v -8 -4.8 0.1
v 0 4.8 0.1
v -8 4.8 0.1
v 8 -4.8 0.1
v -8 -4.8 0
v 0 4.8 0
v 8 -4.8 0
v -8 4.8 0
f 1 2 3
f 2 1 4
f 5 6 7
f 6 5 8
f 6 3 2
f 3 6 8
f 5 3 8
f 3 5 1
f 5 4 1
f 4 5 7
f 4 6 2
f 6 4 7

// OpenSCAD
// file: ../p/4-4edge.scad
use <../lib.scad>
$fa=1; $fs=0.2;
function ldraw_lib__4_4edge(realsolid=false) = [
// 0 Circle 1.0
// 0 Name: 4-4edge.dat
// 0 Author: James Jessiman
// 0 !LDRAW_ORG Primitive UPDATE 2017-01
// 0 !LICENSE Licensed under CC BY 2.0 and CC BY 4.0 : see CAreadme.txt
// 
// 0 BFC CERTIFY CCW
  [0,"BFC","CERTIFY"],
  [0,"BFC","CCW"],
// 
// 0 !HISTORY 1998-12-15 [PTadmin] Official Update 1998-10
// 0 !HISTORY 2005-12-28 [PTadmin] Official Update 2005-01
// 0 !HISTORY 2007-06-24 [PTadmin] Header formatted for Contributor Agreement
// 0 !HISTORY 2008-07-01 [PTadmin] Official Update 2008-01
// 0 !HISTORY 2017-01-15 [Steffen] BFCed
// 0 !HISTORY 2017-12-30 [PTadmin] Official Update 2017-01
// 
// 
// 2 24 1 0 0 0.9239 0 0.3827
  [2,24,1,0,0,0.9239,0,0.3827],
// 2 24 0.9239 0 0.3827 0.7071 0 0.7071
  [2,24,0.9239,0,0.3827,0.7071,0,0.7071],
// 2 24 0.7071 0 0.7071 0.3827 0 0.9239
  [2,24,0.7071,0,0.7071,0.3827,0,0.9239],
// 2 24 0.3827 0 0.9239 0 0 1
  [2,24,0.3827,0,0.9239,0,0,1],
// 2 24 0 0 1 -0.3827 0 0.9239
  [2,24,0,0,1,-0.3827,0,0.9239],
// 2 24 -0.3827 0 0.9239 -0.7071 0 0.7071
  [2,24,-0.3827,0,0.9239,-0.7071,0,0.7071],
// 2 24 -0.7071 0 0.7071 -0.9239 0 0.3827
  [2,24,-0.7071,0,0.7071,-0.9239,0,0.3827],
// 2 24 -0.9239 0 0.3827 -1 0 -0
  [2,24,-0.9239,0,0.3827,-1,0,-0],
// 2 24 -1 0 -0 -0.9239 0 -0.3827
  [2,24,-1,0,-0,-0.9239,0,-0.3827],
// 2 24 -0.9239 0 -0.3827 -0.7071 0 -0.7071
  [2,24,-0.9239,0,-0.3827,-0.7071,0,-0.7071],
// 2 24 -0.7071 0 -0.7071 -0.3827 0 -0.9239
  [2,24,-0.7071,0,-0.7071,-0.3827,0,-0.9239],
// 2 24 -0.3827 0 -0.9239 0 0 -1
  [2,24,-0.3827,0,-0.9239,0,0,-1],
// 2 24 0 0 -1 0.3827 0 -0.9239
  [2,24,0,0,-1,0.3827,0,-0.9239],
// 2 24 0.3827 0 -0.9239 0.7071 0 -0.7071
  [2,24,0.3827,0,-0.9239,0.7071,0,-0.7071],
// 2 24 0.7071 0 -0.7071 0.9239 0 -0.3827
  [2,24,0.7071,0,-0.7071,0.9239,0,-0.3827],
// 2 24 0.9239 0 -0.3827 1 0 0
  [2,24,0.9239,0,-0.3827,1,0,0],
];
module ldraw_lib__4_4edge(step=0, col=false, unit=2/5, alt=false, line=0.2, solid=!$preview)
    makepoly(ldraw_lib__4_4edge(solid), step=step, col=col, unit=unit, alt=alt, line=line, solid=solid);
ldraw_lib__4_4edge(line=0.2);
// file: ../p/4-4disc.scad
use <../lib.scad>
$fa=1; $fs=0.2;
function ldraw_lib__4_4disc(realsolid=false) = [
// 0 Disc 1.0
// 0 Name: 4-4disc.dat
// 0 Author: James Jessiman
// 0 !LDRAW_ORG Primitive UPDATE 2002-02
// 0 !LICENSE Licensed under CC BY 2.0 and CC BY 4.0 : see CAreadme.txt
// 
// 0 BFC CERTIFY CCW
  [0,"BFC","CERTIFY"],
  [0,"BFC","CCW"],
// 
// 0 !HISTORY 1998-12-15 [PTadmin] Official Update 1998-10
// 0 !HISTORY 2002-03-23 [sbliss] Added BFC statement
// 0 !HISTORY 2002-04-25 [PTadmin] Official Update 2002-02
// 0 !HISTORY 2007-06-24 [PTadmin] Header formatted for Contributor Agreement
// 0 !HISTORY 2008-07-01 [PTadmin] Official Update 2008-01
// 
// 
// 3 16 0 0 0 1 0 0 0.9239 0 0.3827
  [3,16,0,0,0,1,0,0,0.9239,0,0.3827],
// 3 16 0 0 0 0.9239 0 0.3827 0.7071 0 0.7071
  [3,16,0,0,0,0.9239,0,0.3827,0.7071,0,0.7071],
// 3 16 0 0 0 0.7071 0 0.7071 0.3827 0 0.9239
  [3,16,0,0,0,0.7071,0,0.7071,0.3827,0,0.9239],
// 3 16 0 0 0 0.3827 0 0.9239 0 0 1
  [3,16,0,0,0,0.3827,0,0.9239,0,0,1],
// 3 16 0 0 0 0 0 1 -0.3827 0 0.9239
  [3,16,0,0,0,0,0,1,-0.3827,0,0.9239],
// 3 16 0 0 0 -0.3827 0 0.9239 -0.7071 0 0.7071
  [3,16,0,0,0,-0.3827,0,0.9239,-0.7071,0,0.7071],
// 3 16 0 0 0 -0.7071 0 0.7071 -0.9239 0 0.3827
  [3,16,0,0,0,-0.7071,0,0.7071,-0.9239,0,0.3827],
// 3 16 0 0 0 -0.9239 0 0.3827 -1 0 -0
  [3,16,0,0,0,-0.9239,0,0.3827,-1,0,-0],
// 3 16 0 0 0 -1 0 -0 -0.9239 0 -0.3827
  [3,16,0,0,0,-1,0,-0,-0.9239,0,-0.3827],
// 3 16 0 0 0 -0.9239 0 -0.3827 -0.7071 0 -0.7071
  [3,16,0,0,0,-0.9239,0,-0.3827,-0.7071,0,-0.7071],
// 3 16 0 0 0 -0.7071 0 -0.7071 -0.3827 0 -0.9239
  [3,16,0,0,0,-0.7071,0,-0.7071,-0.3827,0,-0.9239],
// 3 16 0 0 0 -0.3827 0 -0.9239 0 0 -1
  [3,16,0,0,0,-0.3827,0,-0.9239,0,0,-1],
// 3 16 0 0 0 0 0 -1 0.3827 0 -0.9239
  [3,16,0,0,0,0,0,-1,0.3827,0,-0.9239],
// 3 16 0 0 0 0.3827 0 -0.9239 0.7071 0 -0.7071
  [3,16,0,0,0,0.3827,0,-0.9239,0.7071,0,-0.7071],
// 3 16 0 0 0 0.7071 0 -0.7071 0.9239 0 -0.3827
  [3,16,0,0,0,0.7071,0,-0.7071,0.9239,0,-0.3827],
// 3 16 0 0 0 0.9239 0 -0.3827 1 0 0
  [3,16,0,0,0,0.9239,0,-0.3827,1,0,0],
// 0
];
module ldraw_lib__4_4disc(step=0, col=false, unit=2/5, alt=false, line=0.2, solid=!$preview)
    makepoly(ldraw_lib__4_4disc(solid), step=step, col=col, unit=unit, alt=alt, line=line, solid=solid);
ldraw_lib__4_4disc(line=0.2);
// file: ../p/4-4cyli.scad
use <../lib.scad>
$fa=1; $fs=0.2;
function ldraw_lib__4_4cyli(realsolid=false) = [
// 0 Cylinder 1.0
// 0 Name: 4-4cyli.dat
// 0 Author: James Jessiman
// 0 !LDRAW_ORG Primitive UPDATE 2005-01
// 0 !LICENSE Licensed under CC BY 2.0 and CC BY 4.0 : see CAreadme.txt
// 
// 0 BFC CERTIFY CCW
  [0,"BFC","CERTIFY"],
  [0,"BFC","CCW"],
// 
// 0 !HISTORY 1998-12-15 [PTadmin] Official Update 1998-10
// 0 !HISTORY 2002-03-23 [sbliss] Added BFC statement; merged headers from files in distributions LDraw 0.27 and Complete.
// 0 !HISTORY 2002-04-25 [PTadmin] Official Update 2002-02
// 0 !HISTORY 2004-12-14 [guyvivan] BFC CCW
// 0 !HISTORY 2005-12-28 [PTadmin] Official Update 2005-01
// 0 !HISTORY 2007-06-24 [PTadmin] Header formatted for Contributor Agreement
// 0 !HISTORY 2008-07-01 [PTadmin] Official Update 2008-01
// 
// 
// 4 16 1 1 0 0.9239 1 0.3827 0.9239 0 0.3827 1 0 0
  [4,16,1,1,0,0.9239,1,0.3827,0.9239,0,0.3827,1,0,0],
// 5 24 1 0 0 1 1 0 0.9239 0 0.3827 0.9239 0 -0.3827
  [5,24,1,0,0,1,1,0,0.9239,0,0.3827,0.9239,0,-0.3827],
// 4 16 0.9239 1 0.3827 0.7071 1 0.7071 0.7071 0 0.7071 0.9239 0 0.3827
  [4,16,0.9239,1,0.3827,0.7071,1,0.7071,0.7071,0,0.7071,0.9239,0,0.3827],
// 5 24 0.9239 0 0.3827 0.9239 1 0.3827 0.7071 0 0.7071 1 0 0
  [5,24,0.9239,0,0.3827,0.9239,1,0.3827,0.7071,0,0.7071,1,0,0],
// 4 16 0.7071 1 0.7071 0.3827 1 0.9239 0.3827 0 0.9239 0.7071 0 0.7071
  [4,16,0.7071,1,0.7071,0.3827,1,0.9239,0.3827,0,0.9239,0.7071,0,0.7071],
// 5 24 0.7071 0 0.7071 0.7071 1 0.7071 0.3827 0 0.9239 0.9239 0 0.3827
  [5,24,0.7071,0,0.7071,0.7071,1,0.7071,0.3827,0,0.9239,0.9239,0,0.3827],
// 4 16 0.3827 1 0.9239 0 1 1 0 0 1 0.3827 0 0.9239
  [4,16,0.3827,1,0.9239,0,1,1,0,0,1,0.3827,0,0.9239],
// 5 24 0.3827 0 0.9239 0.3827 1 0.9239 0 0 1 0.7071 0 0.7071
  [5,24,0.3827,0,0.9239,0.3827,1,0.9239,0,0,1,0.7071,0,0.7071],
// 4 16 0 1 1 -0.3827 1 0.9239 -0.3827 0 0.9239 0 0 1
  [4,16,0,1,1,-0.3827,1,0.9239,-0.3827,0,0.9239,0,0,1],
// 5 24 0 0 1 0 1 1 -0.3827 0 0.9239 0.3827 0 0.9239
  [5,24,0,0,1,0,1,1,-0.3827,0,0.9239,0.3827,0,0.9239],
// 4 16 -0.3827 1 0.9239 -0.7071 1 0.7071 -0.7071 0 0.7071 -0.3827 0 0.9239
  [4,16,-0.3827,1,0.9239,-0.7071,1,0.7071,-0.7071,0,0.7071,-0.3827,0,0.9239],
// 5 24 -0.3827 0 0.9239 -0.3827 1 0.9239 -0.7071 0 0.7071 0 0 1
  [5,24,-0.3827,0,0.9239,-0.3827,1,0.9239,-0.7071,0,0.7071,0,0,1],
// 4 16 -0.7071 1 0.7071 -0.9239 1 0.3827 -0.9239 0 0.3827 -0.7071 0 0.7071
  [4,16,-0.7071,1,0.7071,-0.9239,1,0.3827,-0.9239,0,0.3827,-0.7071,0,0.7071],
// 5 24 -0.7071 0 0.7071 -0.7071 1 0.7071 -0.9239 0 0.3827 -0.3827 0 0.9239
  [5,24,-0.7071,0,0.7071,-0.7071,1,0.7071,-0.9239,0,0.3827,-0.3827,0,0.9239],
// 4 16 -0.9239 1 0.3827 -1 1 0 -1 0 0 -0.9239 0 0.3827
  [4,16,-0.9239,1,0.3827,-1,1,0,-1,0,0,-0.9239,0,0.3827],
// 5 24 -0.9239 0 0.3827 -0.9239 1 0.3827 -1 0 0 -0.7071 0 0.7071
  [5,24,-0.9239,0,0.3827,-0.9239,1,0.3827,-1,0,0,-0.7071,0,0.7071],
// 4 16 -1 1 0 -0.9239 1 -0.3827 -0.9239 0 -0.3827 -1 0 0
  [4,16,-1,1,0,-0.9239,1,-0.3827,-0.9239,0,-0.3827,-1,0,0],
// 5 24 -1 0 0 -1 1 0 -0.9239 0 -0.3827 -0.9239 0 0.3827
  [5,24,-1,0,0,-1,1,0,-0.9239,0,-0.3827,-0.9239,0,0.3827],
// 4 16 -0.9239 1 -0.3827 -0.7071 1 -0.7071 -0.7071 0 -0.7071 -0.9239 0 -0.3827
  [4,16,-0.9239,1,-0.3827,-0.7071,1,-0.7071,-0.7071,0,-0.7071,-0.9239,0,-0.3827],
// 5 24 -0.9239 0 -0.3827 -0.9239 1 -0.3827 -0.7071 0 -0.7071 -1 0 0
  [5,24,-0.9239,0,-0.3827,-0.9239,1,-0.3827,-0.7071,0,-0.7071,-1,0,0],
// 4 16 -0.7071 1 -0.7071 -0.3827 1 -0.9239 -0.3827 0 -0.9239 -0.7071 0 -0.7071
  [4,16,-0.7071,1,-0.7071,-0.3827,1,-0.9239,-0.3827,0,-0.9239,-0.7071,0,-0.7071],
// 5 24 -0.7071 0 -0.7071 -0.7071 1 -0.7071 -0.3827 0 -0.9239 -0.9239 0 -0.3827
  [5,24,-0.7071,0,-0.7071,-0.7071,1,-0.7071,-0.3827,0,-0.9239,-0.9239,0,-0.3827],
// 4 16 -0.3827 1 -0.9239 0 1 -1 0 0 -1 -0.3827 0 -0.9239
  [4,16,-0.3827,1,-0.9239,0,1,-1,0,0,-1,-0.3827,0,-0.9239],
// 5 24 -0.3827 0 -0.9239 -0.3827 1 -0.9239 0 0 -1 -0.7071 0 -0.7071
  [5,24,-0.3827,0,-0.9239,-0.3827,1,-0.9239,0,0,-1,-0.7071,0,-0.7071],
// 4 16 0 1 -1 0.3827 1 -0.9239 0.3827 0 -0.9239 0 0 -1
  [4,16,0,1,-1,0.3827,1,-0.9239,0.3827,0,-0.9239,0,0,-1],
// 5 24 0 0 -1 0 1 -1 0.3827 0 -0.9239 -0.3827 0 -0.9239
  [5,24,0,0,-1,0,1,-1,0.3827,0,-0.9239,-0.3827,0,-0.9239],
// 4 16 0.3827 1 -0.9239 0.7071 1 -0.7071 0.7071 0 -0.7071 0.3827 0 -0.9239
  [4,16,0.3827,1,-0.9239,0.7071,1,-0.7071,0.7071,0,-0.7071,0.3827,0,-0.9239],
// 5 24 0.3827 0 -0.9239 0.3827 1 -0.9239 0.7071 0 -0.7071 0 0 -1
  [5,24,0.3827,0,-0.9239,0.3827,1,-0.9239,0.7071,0,-0.7071,0,0,-1],
// 4 16 0.7071 1 -0.7071 0.9239 1 -0.3827 0.9239 0 -0.3827 0.7071 0 -0.7071
  [4,16,0.7071,1,-0.7071,0.9239,1,-0.3827,0.9239,0,-0.3827,0.7071,0,-0.7071],
// 5 24 0.7071 0 -0.7071 0.7071 1 -0.7071 0.9239 0 -0.3827 0.3827 0 -0.9239
  [5,24,0.7071,0,-0.7071,0.7071,1,-0.7071,0.9239,0,-0.3827,0.3827,0,-0.9239],
// 4 16 0.9239 1 -0.3827 1 1 0 1 0 0 0.9239 0 -0.3827
  [4,16,0.9239,1,-0.3827,1,1,0,1,0,0,0.9239,0,-0.3827],
// 5 24 0.9239 0 -0.3827 0.9239 1 -0.3827 1 0 0 0.7071 0 -0.7071
  [5,24,0.9239,0,-0.3827,0.9239,1,-0.3827,1,0,0,0.7071,0,-0.7071],
// 0
];
module ldraw_lib__4_4cyli(step=0, col=false, unit=2/5, alt=false, line=0.2, solid=!$preview)
    makepoly(ldraw_lib__4_4cyli(solid), step=step, col=col, unit=unit, alt=alt, line=line, solid=solid);
ldraw_lib__4_4cyli(line=0.2);
// file: ../p/stud3.scad
use <../lib.scad>
use <4-4cyli.scad>
use <4-4disc.scad>
use <4-4edge.scad>
$fa=1; $fs=0.2;
function ldraw_lib__stud3(realsolid=false) = realsolid ? 
    [openscad(translate([0,0,-eps()], o=cylinder(4+eps(), r=4)),2)] : [
// 0 Stud Tube Solid
// 0 Name: stud3.dat
// 0 Author: James Jessiman
// 0 !LDRAW_ORG Primitive UPDATE 2012-01
// 0 !LICENSE Licensed under CC BY 2.0 and CC BY 4.0 : see CAreadme.txt
// 
// 0 BFC CERTIFY CCW
  [0,"BFC","CERTIFY"],
  [0,"BFC","CCW"],
// 
// 0 !HISTORY 2002-04-04 [sbliss] Modified for BFC compliance
// 0 !HISTORY 2002-04-25 [PTadmin] Official Update 2002-02
// 0 !HISTORY 2007-06-24 [PTadmin] Header formatted for Contributor Agreement
// 0 !HISTORY 2008-07-01 [PTadmin] Official Update 2008-01
// 0 !HISTORY 2012-02-16 [Philo] Changed to CCW
// 0 !HISTORY 2012-03-30 [PTadmin] Official Update 2012-01
// 
// 
// 1 16 0 -4 0 4 0 0 0 1 0 0 0 4 4-4edge.dat
  [1,16,0,-4,0,4,0,0,0,1,0,0,0,4, ldraw_lib__4_4edge(realsolid)],
// 1 16 0 0 0 4 0 0 0 1 0 0 0 4 4-4edge.dat
  [1,16,0,0,0,4,0,0,0,1,0,0,0,4, ldraw_lib__4_4edge(realsolid)],
// 1 16 0 -4 0 4 0 0 0 1 0 0 0 4 4-4disc.dat
  [1,16,0,-4,0,4,0,0,0,1,0,0,0,4, ldraw_lib__4_4disc(realsolid)],
// 1 16 0 -4 0 4 0 0 0 4 0 0 0 4 4-4cyli.dat
  [1,16,0,-4,0,4,0,0,0,4,0,0,0,4, ldraw_lib__4_4cyli(realsolid)],
];
module ldraw_lib__stud3(step=0, col=false, unit=2/5, alt=false, line=0.2, solid=!$preview)
    makepoly(ldraw_lib__stud3(solid), step=step, col=col, unit=unit, alt=alt, line=line, solid=solid);
ldraw_lib__stud3(line=0.2);
// file: ../p/stud.scad
use <../lib.scad>
use <4-4cyli.scad>
use <4-4disc.scad>
use <4-4edge.scad>
$fa=1; $fs=0.2;
function ldraw_lib__stud(realsolid=false) = realsolid ? 
    [openscad(translate([0,0,-eps()], o=cylinder(4+eps(), r=6)),2)] : [
// 0 Stud
// 0 Name: stud.dat
// 0 Author: James Jessiman
// 0 !LDRAW_ORG Primitive UPDATE 2012-01
// 0 !LICENSE Licensed under CC BY 2.0 and CC BY 4.0 : see CAreadme.txt
// 
// 0 BFC CERTIFY CCW
  [0,"BFC","CERTIFY"],
  [0,"BFC","CCW"],
// 
// 0 !HISTORY 2002-04-04 [sbliss] Modified for BFC compliance
// 0 !HISTORY 2002-04-25 [PTadmin] Official Update 2002-02
// 0 !HISTORY 2007-06-24 [PTadmin] Header formatted for Contributor Agreement
// 0 !HISTORY 2008-07-01 [PTadmin] Official Update 2008-01
// 0 !HISTORY 2012-02-16 [Philo] Changed to CCW
// 0 !HISTORY 2012-03-30 [PTadmin] Official Update 2012-01
// 
// 
// 1 16 0 0 0 6 0 0 0 1 0 0 0 6 4-4edge.dat
  [1,16,0,0,0,6,0,0,0,1,0,0,0,6, ldraw_lib__4_4edge(realsolid)],
// 1 16 0 -4 0 6 0 0 0 1 0 0 0 6 4-4edge.dat
  [1,16,0,-4,0,6,0,0,0,1,0,0,0,6, ldraw_lib__4_4edge(realsolid)],
// 1 16 0 0 0 6 0 0 0 -4 0 0 0 6 4-4cyli.dat
  [1,16,0,0,0,6,0,0,0,-4,0,0,0,6, ldraw_lib__4_4cyli(realsolid)],
// 1 16 0 -4 0 6 0 0 0 1 0 0 0 6 4-4disc.dat
  [1,16,0,-4,0,6,0,0,0,1,0,0,0,6, ldraw_lib__4_4disc(realsolid)],
];
module ldraw_lib__stud(step=0, col=false, unit=2/5, alt=false, line=0.2, solid=!$preview)
    makepoly(ldraw_lib__stud(solid), step=step, col=col, unit=unit, alt=alt, line=line, solid=solid);
ldraw_lib__stud(line=0.2);
// file: ../p/box5.scad
use <../lib.scad>
$fa=1; $fs=0.2;
function ldraw_lib__box5(realsolid=false) = [
// 0 Box with 5 Faces and All Edges
// 0 Name: box5.dat
// 0 Author: James Jessiman
// 0 !LDRAW_ORG Primitive UPDATE 2012-01
// 0 !LICENSE Licensed under CC BY 2.0 and CC BY 4.0 : see CAreadme.txt
// 
// 0 BFC CERTIFY CCW
  [0,"BFC","CERTIFY"],
  [0,"BFC","CCW"],
// 
// 0 !HISTORY 2002-04-03 [sbliss] Modified for BFC compliance
// 0 !HISTORY 2002-04-25 [PTadmin] Official Update 2002-02
// 0 !HISTORY 2007-06-24 [PTadmin] Header formatted for Contributor Agreement
// 0 !HISTORY 2008-07-01 [PTadmin] Official Update 2008-01
// 0 !HISTORY 2012-02-16 [Philo] Changed to CCW
// 0 !HISTORY 2012-03-30 [PTadmin] Official Update 2012-01
// 
// 
// 2 24 1 1 1 -1 1 1
  [2,24,1,1,1,-1,1,1],
// 2 24 -1 1 1 -1 1 -1
  [2,24,-1,1,1,-1,1,-1],
// 2 24 -1 1 -1 1 1 -1
  [2,24,-1,1,-1,1,1,-1],
// 2 24 1 1 -1 1 1 1
  [2,24,1,1,-1,1,1,1],
// 2 24 1 0 1 -1 0 1
  [2,24,1,0,1,-1,0,1],
// 2 24 -1 0 1 -1 0 -1
  [2,24,-1,0,1,-1,0,-1],
// 2 24 -1 0 -1 1 0 -1
  [2,24,-1,0,-1,1,0,-1],
// 2 24 1 0 -1 1 0 1
  [2,24,1,0,-1,1,0,1],
// 2 24 1 0 1 1 1 1
  [2,24,1,0,1,1,1,1],
// 2 24 -1 0 1 -1 1 1
  [2,24,-1,0,1,-1,1,1],
// 2 24 1 0 -1 1 1 -1
  [2,24,1,0,-1,1,1,-1],
// 2 24 -1 0 -1 -1 1 -1
  [2,24,-1,0,-1,-1,1,-1],
// 4 16 -1 1 1 1 1 1 1 1 -1 -1 1 -1
  [4,16,-1,1,1,1,1,1,1,1,-1,-1,1,-1],
// 4 16 -1 1 1 -1 0 1 1 0 1 1 1 1
  [4,16,-1,1,1,-1,0,1,1,0,1,1,1,1],
// 4 16 -1 1 -1 -1 0 -1 -1 0 1 -1 1 1
  [4,16,-1,1,-1,-1,0,-1,-1,0,1,-1,1,1],
// 4 16 1 1 -1 1 0 -1 -1 0 -1 -1 1 -1
  [4,16,1,1,-1,1,0,-1,-1,0,-1,-1,1,-1],
// 4 16 1 1 1 1 0 1 1 0 -1 1 1 -1
  [4,16,1,1,1,1,0,1,1,0,-1,1,1,-1],
];
module ldraw_lib__box5(step=0, col=false, unit=2/5, alt=false, line=0.2, solid=!$preview)
    makepoly(ldraw_lib__box5(solid), step=step, col=col, unit=unit, alt=alt, line=line, solid=solid);
ldraw_lib__box5(line=0.2);
// file: ../p/box4t.scad
use <../lib.scad>
$fa=1; $fs=0.2;
function ldraw_lib__box4t(realsolid=false) = [
// 0 Box with 4 Adjacent Faces and All Edges
// 0 Name: box4t.dat
// 0 Author: Tore Eriksson [Tore_Eriksson]
// 0 !LDRAW_ORG Primitive UPDATE 2003-02
// 0 !LICENSE Licensed under CC BY 2.0 and CC BY 4.0 : see CAreadme.txt
// 
// 0 BFC CERTIFY CCW
  [0,"BFC","CERTIFY"],
  [0,"BFC","CCW"],
// 
// 0 !HISTORY 1997-09-29 [PTadmin] Official Update 1997-15
// 0 !HISTORY 2002-08-31 [izanette] Modified with WINDZ for BFC compliance
// 0 !HISTORY 2003-08-01 [PTadmin] Official Update 2003-02
// 0 !HISTORY 2007-06-24 [PTadmin] Header formatted for Contributor Agreement
// 0 !HISTORY 2008-07-01 [PTadmin] Official Update 2008-01
// 
// 
// 2 24 1 1 1 -1 1 1
  [2,24,1,1,1,-1,1,1],
// 2 24 -1 1 1 -1 1 -1
  [2,24,-1,1,1,-1,1,-1],
// 2 24 -1 1 -1 1 1 -1
  [2,24,-1,1,-1,1,1,-1],
// 2 24 1 1 -1 1 1 1
  [2,24,1,1,-1,1,1,1],
// 2 24 1 0 1 -1 0 1
  [2,24,1,0,1,-1,0,1],
// 2 24 -1 0 1 -1 0 -1
  [2,24,-1,0,1,-1,0,-1],
// 2 24 -1 0 -1 1 0 -1
  [2,24,-1,0,-1,1,0,-1],
// 2 24 1 0 -1 1 0 1
  [2,24,1,0,-1,1,0,1],
// 2 24 1 0 1 1 1 1
  [2,24,1,0,1,1,1,1],
// 2 24 -1 0 1 -1 1 1
  [2,24,-1,0,1,-1,1,1],
// 2 24 1 0 -1 1 1 -1
  [2,24,1,0,-1,1,1,-1],
// 2 24 -1 0 -1 -1 1 -1
  [2,24,-1,0,-1,-1,1,-1],
// 4 16 1 1 1 1 1 -1 -1 1 -1 -1 1 1
  [4,16,1,1,1,1,1,-1,-1,1,-1,-1,1,1],
// 4 16 1 1 1 -1 1 1 -1 0 1 1 0 1
  [4,16,1,1,1,-1,1,1,-1,0,1,1,0,1],
// 4 16 -1 1 1 -1 1 -1 -1 0 -1 -1 0 1
  [4,16,-1,1,1,-1,1,-1,-1,0,-1,-1,0,1],
// 0 4 16 -1 1 -1 -1 0 -1 1 0 -1 1 1 -1
// 4 16 1 1 -1 1 1 1 1 0 1 1 0 -1
  [4,16,1,1,-1,1,1,1,1,0,1,1,0,-1],
// 0
];
module ldraw_lib__box4t(step=0, col=false, unit=2/5, alt=false, line=0.2, solid=!$preview)
    makepoly(ldraw_lib__box4t(solid), step=step, col=col, unit=unit, alt=alt, line=line, solid=solid);
ldraw_lib__box4t(line=0.2);
// file: s/3004s01.scad
use <../../lib.scad>
use <../../p/box4t.scad>
use <../../p/box5.scad>
use <../../p/stud.scad>
use <../../p/stud3.scad>
$fa=1; $fs=0.2;
function ldraw_lib__s__3004s01(realsolid=false) = [
// 0 ~Brick  1 x  2 without Front Face
// 0 Name: s\3004s01.dat
// 0 Author: James Jessiman
// 0 !LDRAW_ORG Subpart UPDATE 2003-03
// 0 !LICENSE Licensed under CC BY 2.0 and CC BY 4.0 : see CAreadme.txt
// 
// 0 BFC CERTIFY CCW
  [0,"BFC","CERTIFY"],
  [0,"BFC","CCW"],
// 
// 0 !HISTORY 2003-09-07 [jriley] Subfiling, BFC
// 0 !HISTORY 2003-12-19 [PTadmin] Official Update 2003-03
// 0 !HISTORY 2007-08-29 [PTadmin] Header formatted for Contributor Agreement
// 0 !HISTORY 2008-07-01 [PTadmin] Official Update 2008-01
// 
// 
// 1 16 0 4 0 1 0 0 0 -5 0 0 0 1 stud3.dat
  [1,16,0,4,0,1,0,0,0,-5,0,0,0,1, ldraw_lib__stud3(realsolid)],
// 0 BFC INVERTNEXT
  [0,"BFC","INVERTNEXT"],
// 1 16 0 24 0 16 0 0 0 -20 0 0 0 6 box5.dat
  [1,16,0,24,0,16,0,0,0,-20,0,0,0,6, ldraw_lib__box5(realsolid)],
// 4 16 20 24 10 16 24 6 -16 24 6 -20 24 10
  [4,16,20,24,10,16,24,6,-16,24,6,-20,24,10],
// 4 16 -20 24 10 -16 24 6 -16 24 -6 -20 24 -10
  [4,16,-20,24,10,-16,24,6,-16,24,-6,-20,24,-10],
// 4 16 -20 24 -10 -16 24 -6 16 24 -6 20 24 -10
  [4,16,-20,24,-10,-16,24,-6,16,24,-6,20,24,-10],
// 4 16 20 24 -10 16 24 -6 16 24 6 20 24 10
  [4,16,20,24,-10,16,24,-6,16,24,6,20,24,10],
// 1 16 0 24 0 20 0 0 0 -24 0 0 0 10 box4t.dat
  [1,16,0,24,0,20,0,0,0,-24,0,0,0,10, ldraw_lib__box4t(realsolid)],
// 1 16 10 0 0 1 0 0 0 1 0 0 0 1 stud.dat
  [1,16,10,0,0,1,0,0,0,1,0,0,0,1, ldraw_lib__stud(realsolid)],
// 1 16 -10 0 0 1 0 0 0 1 0 0 0 1 stud.dat
  [1,16,-10,0,0,1,0,0,0,1,0,0,0,1, ldraw_lib__stud(realsolid)],
// 0
];
module ldraw_lib__s__3004s01(step=0, col=false, unit=2/5, alt=false, line=0.2, solid=!$preview)
    makepoly(ldraw_lib__s__3004s01(solid), step=step, col=col, unit=unit, alt=alt, line=line, solid=solid);
ldraw_lib__s__3004s01(line=0.2);
// file: 3004.scad
use <../lib.scad>
use <s/3004s01.scad>
$fa=1; $fs=0.2;
function ldraw_lib__3004(realsolid=false) = [
// 0 Brick  1 x  2
// 0 Name: 3004.dat
// 0 Author: James Jessiman
// 0 !LDRAW_ORG Part UPDATE 2022-05
// 0 !LICENSE Licensed under CC BY 2.0 and CC BY 4.0 : see CAreadme.txt
// 
// 0 BFC CERTIFY CCW
  [0,"BFC","CERTIFY"],
  [0,"BFC","CCW"],
// 
// 0 !HISTORY 2001-10-26 [PTadmin] Official Update 2001-01
// 0 !HISTORY 2002-05-07 {unknown} BFC Certification
// 0 !HISTORY 2002-06-11 [PTadmin] Official Update 2002-03
// 0 !HISTORY 2007-05-07 [PTadmin] Header formatted for Contributor Agreement
// 0 !HISTORY 2008-07-01 [PTadmin] Official Update 2008-01
// 0 !HISTORY 2022-08-04 [MagFors] Using subfile
// 0 !HISTORY 2022-09-15 [PTadmin] Official Update 2022-05
// 
// 
// 1 16 0 0 0 1 0 0 0 1 0 0 0 1 s\3004s01.dat
  [1,16,0,0,0,1,0,0,0,1,0,0,0,1, ldraw_lib__s__3004s01(realsolid)],
// 4 16 -20 24 -10 20 24 -10 20 0 -10 -20 0 -10
  [4,16,-20,24,-10,20,24,-10,20,0,-10,-20,0,-10],
];
module ldraw_lib__3004(step=0, col=false, unit=2/5, alt=false, line=0.2, solid=!$preview)
    makepoly(ldraw_lib__3004(solid), step=step, col=col, unit=unit, alt=alt, line=line, solid=solid);
ldraw_lib__3004(line=0.2);
// file: 164575b.scad
use <../lib.scad>
$fa=1; $fs=0.2;
function ldraw_lib__164575b(realsolid=false) = [
// 0 Sticker Train Front  2 x  6 Stripe Right
// 0 Name: 164575b.dat
// 0 Author: William Howard [WilliamH]
// 0 !LDRAW_ORG Part UPDATE 2014-02
// 0 !LICENSE Licensed under CC BY 2.0 and CC BY 4.0 : see CAreadme.txt
// 
// 0 BFC CERTIFY CCW
  [0,"BFC","CERTIFY"],
  [0,"BFC","CCW"],
// 
// 0 !HISTORY 2013-08-08 [MMR1988] Inlined Subpart and corrected dimensions
// 0 !HISTORY 2014-12-23 [PTadmin] Official Update 2014-02
// 
// 
// 4 15 -20 -0.25 -12 0 -0.25 -12 20 -0.25 12 -20 -0.25 12
  [4,15,-20,-0.25,-12,0,-0.25,-12,20,-0.25,12,-20,-0.25,12],
// 4 16 -20 0 12 20 0 12 0 0 -12 -20 0 -12
  [4,16,-20,0,12,20,0,12,0,0,-12,-20,0,-12],
// 4 16 -20 0 -12 0 0 -12 0 -0.25 -12 -20 -0.25 -12
  [4,16,-20,0,-12,0,0,-12,0,-0.25,-12,-20,-0.25,-12],
// 4 16 -20 0 12 -20 0 -12 -20 -0.25 -12 -20 -0.25 12
  [4,16,-20,0,12,-20,0,-12,-20,-0.25,-12,-20,-0.25,12],
// 4 16 -20 -0.25 12 20 -0.25 12 20 0 12 -20 0 12
  [4,16,-20,-0.25,12,20,-0.25,12,20,0,12,-20,0,12],
// 4 16 20 -0.25 12 0 -0.25 -12 0 0 -12 20 0 12
  [4,16,20,-0.25,12,0,-0.25,-12,0,0,-12,20,0,12],
];
module ldraw_lib__164575b(step=0, col=false, unit=2/5, alt=false, line=0.2, solid=!$preview)
    makepoly(ldraw_lib__164575b(solid), step=step, col=col, unit=unit, alt=alt, line=line, solid=solid);
ldraw_lib__164575b(line=0.2);
// main file
use <../lib.scad>
use <164575b.scad>
$fa=1; $fs=0.2;
function ldraw_lib__164575c(realsolid=false) = [
// 0 Sticker Train Front  2 x  6 Stripe Left
// 0 Name: 164575c.dat
// 0 Author: William Howard [WilliamH]
// 0 !LDRAW_ORG Part UPDATE 2014-02
// 0 !LICENSE Licensed under CC BY 2.0 and CC BY 4.0 : see CAreadme.txt
// 
// 0 BFC CERTIFY CCW
  [0,"BFC","CERTIFY"],
  [0,"BFC","CCW"],
// 
// 0 !HISTORY 2013-08-08 [MMR1988] Inlined Subpart and corrected dimensions
// 0 !HISTORY 2014-12-23 [PTadmin] Official Update 2014-02
// 
// 
// 1 16 0 0 0 1 0 0 0 1 0 0 0 -1 164575b.dat
  [1,16,0,0,0,1,0,0,0,1,0,0,0,-1, ldraw_lib__164575b(realsolid)],
];
module ldraw_lib__164575c(step=0, col=false, unit=2/5, alt=false, line=0.2, solid=!$preview)
    makepoly(ldraw_lib__164575c(solid), step=step, col=col, unit=unit, alt=alt, line=line, solid=solid);
ldraw_lib__164575c(line=0.2);
